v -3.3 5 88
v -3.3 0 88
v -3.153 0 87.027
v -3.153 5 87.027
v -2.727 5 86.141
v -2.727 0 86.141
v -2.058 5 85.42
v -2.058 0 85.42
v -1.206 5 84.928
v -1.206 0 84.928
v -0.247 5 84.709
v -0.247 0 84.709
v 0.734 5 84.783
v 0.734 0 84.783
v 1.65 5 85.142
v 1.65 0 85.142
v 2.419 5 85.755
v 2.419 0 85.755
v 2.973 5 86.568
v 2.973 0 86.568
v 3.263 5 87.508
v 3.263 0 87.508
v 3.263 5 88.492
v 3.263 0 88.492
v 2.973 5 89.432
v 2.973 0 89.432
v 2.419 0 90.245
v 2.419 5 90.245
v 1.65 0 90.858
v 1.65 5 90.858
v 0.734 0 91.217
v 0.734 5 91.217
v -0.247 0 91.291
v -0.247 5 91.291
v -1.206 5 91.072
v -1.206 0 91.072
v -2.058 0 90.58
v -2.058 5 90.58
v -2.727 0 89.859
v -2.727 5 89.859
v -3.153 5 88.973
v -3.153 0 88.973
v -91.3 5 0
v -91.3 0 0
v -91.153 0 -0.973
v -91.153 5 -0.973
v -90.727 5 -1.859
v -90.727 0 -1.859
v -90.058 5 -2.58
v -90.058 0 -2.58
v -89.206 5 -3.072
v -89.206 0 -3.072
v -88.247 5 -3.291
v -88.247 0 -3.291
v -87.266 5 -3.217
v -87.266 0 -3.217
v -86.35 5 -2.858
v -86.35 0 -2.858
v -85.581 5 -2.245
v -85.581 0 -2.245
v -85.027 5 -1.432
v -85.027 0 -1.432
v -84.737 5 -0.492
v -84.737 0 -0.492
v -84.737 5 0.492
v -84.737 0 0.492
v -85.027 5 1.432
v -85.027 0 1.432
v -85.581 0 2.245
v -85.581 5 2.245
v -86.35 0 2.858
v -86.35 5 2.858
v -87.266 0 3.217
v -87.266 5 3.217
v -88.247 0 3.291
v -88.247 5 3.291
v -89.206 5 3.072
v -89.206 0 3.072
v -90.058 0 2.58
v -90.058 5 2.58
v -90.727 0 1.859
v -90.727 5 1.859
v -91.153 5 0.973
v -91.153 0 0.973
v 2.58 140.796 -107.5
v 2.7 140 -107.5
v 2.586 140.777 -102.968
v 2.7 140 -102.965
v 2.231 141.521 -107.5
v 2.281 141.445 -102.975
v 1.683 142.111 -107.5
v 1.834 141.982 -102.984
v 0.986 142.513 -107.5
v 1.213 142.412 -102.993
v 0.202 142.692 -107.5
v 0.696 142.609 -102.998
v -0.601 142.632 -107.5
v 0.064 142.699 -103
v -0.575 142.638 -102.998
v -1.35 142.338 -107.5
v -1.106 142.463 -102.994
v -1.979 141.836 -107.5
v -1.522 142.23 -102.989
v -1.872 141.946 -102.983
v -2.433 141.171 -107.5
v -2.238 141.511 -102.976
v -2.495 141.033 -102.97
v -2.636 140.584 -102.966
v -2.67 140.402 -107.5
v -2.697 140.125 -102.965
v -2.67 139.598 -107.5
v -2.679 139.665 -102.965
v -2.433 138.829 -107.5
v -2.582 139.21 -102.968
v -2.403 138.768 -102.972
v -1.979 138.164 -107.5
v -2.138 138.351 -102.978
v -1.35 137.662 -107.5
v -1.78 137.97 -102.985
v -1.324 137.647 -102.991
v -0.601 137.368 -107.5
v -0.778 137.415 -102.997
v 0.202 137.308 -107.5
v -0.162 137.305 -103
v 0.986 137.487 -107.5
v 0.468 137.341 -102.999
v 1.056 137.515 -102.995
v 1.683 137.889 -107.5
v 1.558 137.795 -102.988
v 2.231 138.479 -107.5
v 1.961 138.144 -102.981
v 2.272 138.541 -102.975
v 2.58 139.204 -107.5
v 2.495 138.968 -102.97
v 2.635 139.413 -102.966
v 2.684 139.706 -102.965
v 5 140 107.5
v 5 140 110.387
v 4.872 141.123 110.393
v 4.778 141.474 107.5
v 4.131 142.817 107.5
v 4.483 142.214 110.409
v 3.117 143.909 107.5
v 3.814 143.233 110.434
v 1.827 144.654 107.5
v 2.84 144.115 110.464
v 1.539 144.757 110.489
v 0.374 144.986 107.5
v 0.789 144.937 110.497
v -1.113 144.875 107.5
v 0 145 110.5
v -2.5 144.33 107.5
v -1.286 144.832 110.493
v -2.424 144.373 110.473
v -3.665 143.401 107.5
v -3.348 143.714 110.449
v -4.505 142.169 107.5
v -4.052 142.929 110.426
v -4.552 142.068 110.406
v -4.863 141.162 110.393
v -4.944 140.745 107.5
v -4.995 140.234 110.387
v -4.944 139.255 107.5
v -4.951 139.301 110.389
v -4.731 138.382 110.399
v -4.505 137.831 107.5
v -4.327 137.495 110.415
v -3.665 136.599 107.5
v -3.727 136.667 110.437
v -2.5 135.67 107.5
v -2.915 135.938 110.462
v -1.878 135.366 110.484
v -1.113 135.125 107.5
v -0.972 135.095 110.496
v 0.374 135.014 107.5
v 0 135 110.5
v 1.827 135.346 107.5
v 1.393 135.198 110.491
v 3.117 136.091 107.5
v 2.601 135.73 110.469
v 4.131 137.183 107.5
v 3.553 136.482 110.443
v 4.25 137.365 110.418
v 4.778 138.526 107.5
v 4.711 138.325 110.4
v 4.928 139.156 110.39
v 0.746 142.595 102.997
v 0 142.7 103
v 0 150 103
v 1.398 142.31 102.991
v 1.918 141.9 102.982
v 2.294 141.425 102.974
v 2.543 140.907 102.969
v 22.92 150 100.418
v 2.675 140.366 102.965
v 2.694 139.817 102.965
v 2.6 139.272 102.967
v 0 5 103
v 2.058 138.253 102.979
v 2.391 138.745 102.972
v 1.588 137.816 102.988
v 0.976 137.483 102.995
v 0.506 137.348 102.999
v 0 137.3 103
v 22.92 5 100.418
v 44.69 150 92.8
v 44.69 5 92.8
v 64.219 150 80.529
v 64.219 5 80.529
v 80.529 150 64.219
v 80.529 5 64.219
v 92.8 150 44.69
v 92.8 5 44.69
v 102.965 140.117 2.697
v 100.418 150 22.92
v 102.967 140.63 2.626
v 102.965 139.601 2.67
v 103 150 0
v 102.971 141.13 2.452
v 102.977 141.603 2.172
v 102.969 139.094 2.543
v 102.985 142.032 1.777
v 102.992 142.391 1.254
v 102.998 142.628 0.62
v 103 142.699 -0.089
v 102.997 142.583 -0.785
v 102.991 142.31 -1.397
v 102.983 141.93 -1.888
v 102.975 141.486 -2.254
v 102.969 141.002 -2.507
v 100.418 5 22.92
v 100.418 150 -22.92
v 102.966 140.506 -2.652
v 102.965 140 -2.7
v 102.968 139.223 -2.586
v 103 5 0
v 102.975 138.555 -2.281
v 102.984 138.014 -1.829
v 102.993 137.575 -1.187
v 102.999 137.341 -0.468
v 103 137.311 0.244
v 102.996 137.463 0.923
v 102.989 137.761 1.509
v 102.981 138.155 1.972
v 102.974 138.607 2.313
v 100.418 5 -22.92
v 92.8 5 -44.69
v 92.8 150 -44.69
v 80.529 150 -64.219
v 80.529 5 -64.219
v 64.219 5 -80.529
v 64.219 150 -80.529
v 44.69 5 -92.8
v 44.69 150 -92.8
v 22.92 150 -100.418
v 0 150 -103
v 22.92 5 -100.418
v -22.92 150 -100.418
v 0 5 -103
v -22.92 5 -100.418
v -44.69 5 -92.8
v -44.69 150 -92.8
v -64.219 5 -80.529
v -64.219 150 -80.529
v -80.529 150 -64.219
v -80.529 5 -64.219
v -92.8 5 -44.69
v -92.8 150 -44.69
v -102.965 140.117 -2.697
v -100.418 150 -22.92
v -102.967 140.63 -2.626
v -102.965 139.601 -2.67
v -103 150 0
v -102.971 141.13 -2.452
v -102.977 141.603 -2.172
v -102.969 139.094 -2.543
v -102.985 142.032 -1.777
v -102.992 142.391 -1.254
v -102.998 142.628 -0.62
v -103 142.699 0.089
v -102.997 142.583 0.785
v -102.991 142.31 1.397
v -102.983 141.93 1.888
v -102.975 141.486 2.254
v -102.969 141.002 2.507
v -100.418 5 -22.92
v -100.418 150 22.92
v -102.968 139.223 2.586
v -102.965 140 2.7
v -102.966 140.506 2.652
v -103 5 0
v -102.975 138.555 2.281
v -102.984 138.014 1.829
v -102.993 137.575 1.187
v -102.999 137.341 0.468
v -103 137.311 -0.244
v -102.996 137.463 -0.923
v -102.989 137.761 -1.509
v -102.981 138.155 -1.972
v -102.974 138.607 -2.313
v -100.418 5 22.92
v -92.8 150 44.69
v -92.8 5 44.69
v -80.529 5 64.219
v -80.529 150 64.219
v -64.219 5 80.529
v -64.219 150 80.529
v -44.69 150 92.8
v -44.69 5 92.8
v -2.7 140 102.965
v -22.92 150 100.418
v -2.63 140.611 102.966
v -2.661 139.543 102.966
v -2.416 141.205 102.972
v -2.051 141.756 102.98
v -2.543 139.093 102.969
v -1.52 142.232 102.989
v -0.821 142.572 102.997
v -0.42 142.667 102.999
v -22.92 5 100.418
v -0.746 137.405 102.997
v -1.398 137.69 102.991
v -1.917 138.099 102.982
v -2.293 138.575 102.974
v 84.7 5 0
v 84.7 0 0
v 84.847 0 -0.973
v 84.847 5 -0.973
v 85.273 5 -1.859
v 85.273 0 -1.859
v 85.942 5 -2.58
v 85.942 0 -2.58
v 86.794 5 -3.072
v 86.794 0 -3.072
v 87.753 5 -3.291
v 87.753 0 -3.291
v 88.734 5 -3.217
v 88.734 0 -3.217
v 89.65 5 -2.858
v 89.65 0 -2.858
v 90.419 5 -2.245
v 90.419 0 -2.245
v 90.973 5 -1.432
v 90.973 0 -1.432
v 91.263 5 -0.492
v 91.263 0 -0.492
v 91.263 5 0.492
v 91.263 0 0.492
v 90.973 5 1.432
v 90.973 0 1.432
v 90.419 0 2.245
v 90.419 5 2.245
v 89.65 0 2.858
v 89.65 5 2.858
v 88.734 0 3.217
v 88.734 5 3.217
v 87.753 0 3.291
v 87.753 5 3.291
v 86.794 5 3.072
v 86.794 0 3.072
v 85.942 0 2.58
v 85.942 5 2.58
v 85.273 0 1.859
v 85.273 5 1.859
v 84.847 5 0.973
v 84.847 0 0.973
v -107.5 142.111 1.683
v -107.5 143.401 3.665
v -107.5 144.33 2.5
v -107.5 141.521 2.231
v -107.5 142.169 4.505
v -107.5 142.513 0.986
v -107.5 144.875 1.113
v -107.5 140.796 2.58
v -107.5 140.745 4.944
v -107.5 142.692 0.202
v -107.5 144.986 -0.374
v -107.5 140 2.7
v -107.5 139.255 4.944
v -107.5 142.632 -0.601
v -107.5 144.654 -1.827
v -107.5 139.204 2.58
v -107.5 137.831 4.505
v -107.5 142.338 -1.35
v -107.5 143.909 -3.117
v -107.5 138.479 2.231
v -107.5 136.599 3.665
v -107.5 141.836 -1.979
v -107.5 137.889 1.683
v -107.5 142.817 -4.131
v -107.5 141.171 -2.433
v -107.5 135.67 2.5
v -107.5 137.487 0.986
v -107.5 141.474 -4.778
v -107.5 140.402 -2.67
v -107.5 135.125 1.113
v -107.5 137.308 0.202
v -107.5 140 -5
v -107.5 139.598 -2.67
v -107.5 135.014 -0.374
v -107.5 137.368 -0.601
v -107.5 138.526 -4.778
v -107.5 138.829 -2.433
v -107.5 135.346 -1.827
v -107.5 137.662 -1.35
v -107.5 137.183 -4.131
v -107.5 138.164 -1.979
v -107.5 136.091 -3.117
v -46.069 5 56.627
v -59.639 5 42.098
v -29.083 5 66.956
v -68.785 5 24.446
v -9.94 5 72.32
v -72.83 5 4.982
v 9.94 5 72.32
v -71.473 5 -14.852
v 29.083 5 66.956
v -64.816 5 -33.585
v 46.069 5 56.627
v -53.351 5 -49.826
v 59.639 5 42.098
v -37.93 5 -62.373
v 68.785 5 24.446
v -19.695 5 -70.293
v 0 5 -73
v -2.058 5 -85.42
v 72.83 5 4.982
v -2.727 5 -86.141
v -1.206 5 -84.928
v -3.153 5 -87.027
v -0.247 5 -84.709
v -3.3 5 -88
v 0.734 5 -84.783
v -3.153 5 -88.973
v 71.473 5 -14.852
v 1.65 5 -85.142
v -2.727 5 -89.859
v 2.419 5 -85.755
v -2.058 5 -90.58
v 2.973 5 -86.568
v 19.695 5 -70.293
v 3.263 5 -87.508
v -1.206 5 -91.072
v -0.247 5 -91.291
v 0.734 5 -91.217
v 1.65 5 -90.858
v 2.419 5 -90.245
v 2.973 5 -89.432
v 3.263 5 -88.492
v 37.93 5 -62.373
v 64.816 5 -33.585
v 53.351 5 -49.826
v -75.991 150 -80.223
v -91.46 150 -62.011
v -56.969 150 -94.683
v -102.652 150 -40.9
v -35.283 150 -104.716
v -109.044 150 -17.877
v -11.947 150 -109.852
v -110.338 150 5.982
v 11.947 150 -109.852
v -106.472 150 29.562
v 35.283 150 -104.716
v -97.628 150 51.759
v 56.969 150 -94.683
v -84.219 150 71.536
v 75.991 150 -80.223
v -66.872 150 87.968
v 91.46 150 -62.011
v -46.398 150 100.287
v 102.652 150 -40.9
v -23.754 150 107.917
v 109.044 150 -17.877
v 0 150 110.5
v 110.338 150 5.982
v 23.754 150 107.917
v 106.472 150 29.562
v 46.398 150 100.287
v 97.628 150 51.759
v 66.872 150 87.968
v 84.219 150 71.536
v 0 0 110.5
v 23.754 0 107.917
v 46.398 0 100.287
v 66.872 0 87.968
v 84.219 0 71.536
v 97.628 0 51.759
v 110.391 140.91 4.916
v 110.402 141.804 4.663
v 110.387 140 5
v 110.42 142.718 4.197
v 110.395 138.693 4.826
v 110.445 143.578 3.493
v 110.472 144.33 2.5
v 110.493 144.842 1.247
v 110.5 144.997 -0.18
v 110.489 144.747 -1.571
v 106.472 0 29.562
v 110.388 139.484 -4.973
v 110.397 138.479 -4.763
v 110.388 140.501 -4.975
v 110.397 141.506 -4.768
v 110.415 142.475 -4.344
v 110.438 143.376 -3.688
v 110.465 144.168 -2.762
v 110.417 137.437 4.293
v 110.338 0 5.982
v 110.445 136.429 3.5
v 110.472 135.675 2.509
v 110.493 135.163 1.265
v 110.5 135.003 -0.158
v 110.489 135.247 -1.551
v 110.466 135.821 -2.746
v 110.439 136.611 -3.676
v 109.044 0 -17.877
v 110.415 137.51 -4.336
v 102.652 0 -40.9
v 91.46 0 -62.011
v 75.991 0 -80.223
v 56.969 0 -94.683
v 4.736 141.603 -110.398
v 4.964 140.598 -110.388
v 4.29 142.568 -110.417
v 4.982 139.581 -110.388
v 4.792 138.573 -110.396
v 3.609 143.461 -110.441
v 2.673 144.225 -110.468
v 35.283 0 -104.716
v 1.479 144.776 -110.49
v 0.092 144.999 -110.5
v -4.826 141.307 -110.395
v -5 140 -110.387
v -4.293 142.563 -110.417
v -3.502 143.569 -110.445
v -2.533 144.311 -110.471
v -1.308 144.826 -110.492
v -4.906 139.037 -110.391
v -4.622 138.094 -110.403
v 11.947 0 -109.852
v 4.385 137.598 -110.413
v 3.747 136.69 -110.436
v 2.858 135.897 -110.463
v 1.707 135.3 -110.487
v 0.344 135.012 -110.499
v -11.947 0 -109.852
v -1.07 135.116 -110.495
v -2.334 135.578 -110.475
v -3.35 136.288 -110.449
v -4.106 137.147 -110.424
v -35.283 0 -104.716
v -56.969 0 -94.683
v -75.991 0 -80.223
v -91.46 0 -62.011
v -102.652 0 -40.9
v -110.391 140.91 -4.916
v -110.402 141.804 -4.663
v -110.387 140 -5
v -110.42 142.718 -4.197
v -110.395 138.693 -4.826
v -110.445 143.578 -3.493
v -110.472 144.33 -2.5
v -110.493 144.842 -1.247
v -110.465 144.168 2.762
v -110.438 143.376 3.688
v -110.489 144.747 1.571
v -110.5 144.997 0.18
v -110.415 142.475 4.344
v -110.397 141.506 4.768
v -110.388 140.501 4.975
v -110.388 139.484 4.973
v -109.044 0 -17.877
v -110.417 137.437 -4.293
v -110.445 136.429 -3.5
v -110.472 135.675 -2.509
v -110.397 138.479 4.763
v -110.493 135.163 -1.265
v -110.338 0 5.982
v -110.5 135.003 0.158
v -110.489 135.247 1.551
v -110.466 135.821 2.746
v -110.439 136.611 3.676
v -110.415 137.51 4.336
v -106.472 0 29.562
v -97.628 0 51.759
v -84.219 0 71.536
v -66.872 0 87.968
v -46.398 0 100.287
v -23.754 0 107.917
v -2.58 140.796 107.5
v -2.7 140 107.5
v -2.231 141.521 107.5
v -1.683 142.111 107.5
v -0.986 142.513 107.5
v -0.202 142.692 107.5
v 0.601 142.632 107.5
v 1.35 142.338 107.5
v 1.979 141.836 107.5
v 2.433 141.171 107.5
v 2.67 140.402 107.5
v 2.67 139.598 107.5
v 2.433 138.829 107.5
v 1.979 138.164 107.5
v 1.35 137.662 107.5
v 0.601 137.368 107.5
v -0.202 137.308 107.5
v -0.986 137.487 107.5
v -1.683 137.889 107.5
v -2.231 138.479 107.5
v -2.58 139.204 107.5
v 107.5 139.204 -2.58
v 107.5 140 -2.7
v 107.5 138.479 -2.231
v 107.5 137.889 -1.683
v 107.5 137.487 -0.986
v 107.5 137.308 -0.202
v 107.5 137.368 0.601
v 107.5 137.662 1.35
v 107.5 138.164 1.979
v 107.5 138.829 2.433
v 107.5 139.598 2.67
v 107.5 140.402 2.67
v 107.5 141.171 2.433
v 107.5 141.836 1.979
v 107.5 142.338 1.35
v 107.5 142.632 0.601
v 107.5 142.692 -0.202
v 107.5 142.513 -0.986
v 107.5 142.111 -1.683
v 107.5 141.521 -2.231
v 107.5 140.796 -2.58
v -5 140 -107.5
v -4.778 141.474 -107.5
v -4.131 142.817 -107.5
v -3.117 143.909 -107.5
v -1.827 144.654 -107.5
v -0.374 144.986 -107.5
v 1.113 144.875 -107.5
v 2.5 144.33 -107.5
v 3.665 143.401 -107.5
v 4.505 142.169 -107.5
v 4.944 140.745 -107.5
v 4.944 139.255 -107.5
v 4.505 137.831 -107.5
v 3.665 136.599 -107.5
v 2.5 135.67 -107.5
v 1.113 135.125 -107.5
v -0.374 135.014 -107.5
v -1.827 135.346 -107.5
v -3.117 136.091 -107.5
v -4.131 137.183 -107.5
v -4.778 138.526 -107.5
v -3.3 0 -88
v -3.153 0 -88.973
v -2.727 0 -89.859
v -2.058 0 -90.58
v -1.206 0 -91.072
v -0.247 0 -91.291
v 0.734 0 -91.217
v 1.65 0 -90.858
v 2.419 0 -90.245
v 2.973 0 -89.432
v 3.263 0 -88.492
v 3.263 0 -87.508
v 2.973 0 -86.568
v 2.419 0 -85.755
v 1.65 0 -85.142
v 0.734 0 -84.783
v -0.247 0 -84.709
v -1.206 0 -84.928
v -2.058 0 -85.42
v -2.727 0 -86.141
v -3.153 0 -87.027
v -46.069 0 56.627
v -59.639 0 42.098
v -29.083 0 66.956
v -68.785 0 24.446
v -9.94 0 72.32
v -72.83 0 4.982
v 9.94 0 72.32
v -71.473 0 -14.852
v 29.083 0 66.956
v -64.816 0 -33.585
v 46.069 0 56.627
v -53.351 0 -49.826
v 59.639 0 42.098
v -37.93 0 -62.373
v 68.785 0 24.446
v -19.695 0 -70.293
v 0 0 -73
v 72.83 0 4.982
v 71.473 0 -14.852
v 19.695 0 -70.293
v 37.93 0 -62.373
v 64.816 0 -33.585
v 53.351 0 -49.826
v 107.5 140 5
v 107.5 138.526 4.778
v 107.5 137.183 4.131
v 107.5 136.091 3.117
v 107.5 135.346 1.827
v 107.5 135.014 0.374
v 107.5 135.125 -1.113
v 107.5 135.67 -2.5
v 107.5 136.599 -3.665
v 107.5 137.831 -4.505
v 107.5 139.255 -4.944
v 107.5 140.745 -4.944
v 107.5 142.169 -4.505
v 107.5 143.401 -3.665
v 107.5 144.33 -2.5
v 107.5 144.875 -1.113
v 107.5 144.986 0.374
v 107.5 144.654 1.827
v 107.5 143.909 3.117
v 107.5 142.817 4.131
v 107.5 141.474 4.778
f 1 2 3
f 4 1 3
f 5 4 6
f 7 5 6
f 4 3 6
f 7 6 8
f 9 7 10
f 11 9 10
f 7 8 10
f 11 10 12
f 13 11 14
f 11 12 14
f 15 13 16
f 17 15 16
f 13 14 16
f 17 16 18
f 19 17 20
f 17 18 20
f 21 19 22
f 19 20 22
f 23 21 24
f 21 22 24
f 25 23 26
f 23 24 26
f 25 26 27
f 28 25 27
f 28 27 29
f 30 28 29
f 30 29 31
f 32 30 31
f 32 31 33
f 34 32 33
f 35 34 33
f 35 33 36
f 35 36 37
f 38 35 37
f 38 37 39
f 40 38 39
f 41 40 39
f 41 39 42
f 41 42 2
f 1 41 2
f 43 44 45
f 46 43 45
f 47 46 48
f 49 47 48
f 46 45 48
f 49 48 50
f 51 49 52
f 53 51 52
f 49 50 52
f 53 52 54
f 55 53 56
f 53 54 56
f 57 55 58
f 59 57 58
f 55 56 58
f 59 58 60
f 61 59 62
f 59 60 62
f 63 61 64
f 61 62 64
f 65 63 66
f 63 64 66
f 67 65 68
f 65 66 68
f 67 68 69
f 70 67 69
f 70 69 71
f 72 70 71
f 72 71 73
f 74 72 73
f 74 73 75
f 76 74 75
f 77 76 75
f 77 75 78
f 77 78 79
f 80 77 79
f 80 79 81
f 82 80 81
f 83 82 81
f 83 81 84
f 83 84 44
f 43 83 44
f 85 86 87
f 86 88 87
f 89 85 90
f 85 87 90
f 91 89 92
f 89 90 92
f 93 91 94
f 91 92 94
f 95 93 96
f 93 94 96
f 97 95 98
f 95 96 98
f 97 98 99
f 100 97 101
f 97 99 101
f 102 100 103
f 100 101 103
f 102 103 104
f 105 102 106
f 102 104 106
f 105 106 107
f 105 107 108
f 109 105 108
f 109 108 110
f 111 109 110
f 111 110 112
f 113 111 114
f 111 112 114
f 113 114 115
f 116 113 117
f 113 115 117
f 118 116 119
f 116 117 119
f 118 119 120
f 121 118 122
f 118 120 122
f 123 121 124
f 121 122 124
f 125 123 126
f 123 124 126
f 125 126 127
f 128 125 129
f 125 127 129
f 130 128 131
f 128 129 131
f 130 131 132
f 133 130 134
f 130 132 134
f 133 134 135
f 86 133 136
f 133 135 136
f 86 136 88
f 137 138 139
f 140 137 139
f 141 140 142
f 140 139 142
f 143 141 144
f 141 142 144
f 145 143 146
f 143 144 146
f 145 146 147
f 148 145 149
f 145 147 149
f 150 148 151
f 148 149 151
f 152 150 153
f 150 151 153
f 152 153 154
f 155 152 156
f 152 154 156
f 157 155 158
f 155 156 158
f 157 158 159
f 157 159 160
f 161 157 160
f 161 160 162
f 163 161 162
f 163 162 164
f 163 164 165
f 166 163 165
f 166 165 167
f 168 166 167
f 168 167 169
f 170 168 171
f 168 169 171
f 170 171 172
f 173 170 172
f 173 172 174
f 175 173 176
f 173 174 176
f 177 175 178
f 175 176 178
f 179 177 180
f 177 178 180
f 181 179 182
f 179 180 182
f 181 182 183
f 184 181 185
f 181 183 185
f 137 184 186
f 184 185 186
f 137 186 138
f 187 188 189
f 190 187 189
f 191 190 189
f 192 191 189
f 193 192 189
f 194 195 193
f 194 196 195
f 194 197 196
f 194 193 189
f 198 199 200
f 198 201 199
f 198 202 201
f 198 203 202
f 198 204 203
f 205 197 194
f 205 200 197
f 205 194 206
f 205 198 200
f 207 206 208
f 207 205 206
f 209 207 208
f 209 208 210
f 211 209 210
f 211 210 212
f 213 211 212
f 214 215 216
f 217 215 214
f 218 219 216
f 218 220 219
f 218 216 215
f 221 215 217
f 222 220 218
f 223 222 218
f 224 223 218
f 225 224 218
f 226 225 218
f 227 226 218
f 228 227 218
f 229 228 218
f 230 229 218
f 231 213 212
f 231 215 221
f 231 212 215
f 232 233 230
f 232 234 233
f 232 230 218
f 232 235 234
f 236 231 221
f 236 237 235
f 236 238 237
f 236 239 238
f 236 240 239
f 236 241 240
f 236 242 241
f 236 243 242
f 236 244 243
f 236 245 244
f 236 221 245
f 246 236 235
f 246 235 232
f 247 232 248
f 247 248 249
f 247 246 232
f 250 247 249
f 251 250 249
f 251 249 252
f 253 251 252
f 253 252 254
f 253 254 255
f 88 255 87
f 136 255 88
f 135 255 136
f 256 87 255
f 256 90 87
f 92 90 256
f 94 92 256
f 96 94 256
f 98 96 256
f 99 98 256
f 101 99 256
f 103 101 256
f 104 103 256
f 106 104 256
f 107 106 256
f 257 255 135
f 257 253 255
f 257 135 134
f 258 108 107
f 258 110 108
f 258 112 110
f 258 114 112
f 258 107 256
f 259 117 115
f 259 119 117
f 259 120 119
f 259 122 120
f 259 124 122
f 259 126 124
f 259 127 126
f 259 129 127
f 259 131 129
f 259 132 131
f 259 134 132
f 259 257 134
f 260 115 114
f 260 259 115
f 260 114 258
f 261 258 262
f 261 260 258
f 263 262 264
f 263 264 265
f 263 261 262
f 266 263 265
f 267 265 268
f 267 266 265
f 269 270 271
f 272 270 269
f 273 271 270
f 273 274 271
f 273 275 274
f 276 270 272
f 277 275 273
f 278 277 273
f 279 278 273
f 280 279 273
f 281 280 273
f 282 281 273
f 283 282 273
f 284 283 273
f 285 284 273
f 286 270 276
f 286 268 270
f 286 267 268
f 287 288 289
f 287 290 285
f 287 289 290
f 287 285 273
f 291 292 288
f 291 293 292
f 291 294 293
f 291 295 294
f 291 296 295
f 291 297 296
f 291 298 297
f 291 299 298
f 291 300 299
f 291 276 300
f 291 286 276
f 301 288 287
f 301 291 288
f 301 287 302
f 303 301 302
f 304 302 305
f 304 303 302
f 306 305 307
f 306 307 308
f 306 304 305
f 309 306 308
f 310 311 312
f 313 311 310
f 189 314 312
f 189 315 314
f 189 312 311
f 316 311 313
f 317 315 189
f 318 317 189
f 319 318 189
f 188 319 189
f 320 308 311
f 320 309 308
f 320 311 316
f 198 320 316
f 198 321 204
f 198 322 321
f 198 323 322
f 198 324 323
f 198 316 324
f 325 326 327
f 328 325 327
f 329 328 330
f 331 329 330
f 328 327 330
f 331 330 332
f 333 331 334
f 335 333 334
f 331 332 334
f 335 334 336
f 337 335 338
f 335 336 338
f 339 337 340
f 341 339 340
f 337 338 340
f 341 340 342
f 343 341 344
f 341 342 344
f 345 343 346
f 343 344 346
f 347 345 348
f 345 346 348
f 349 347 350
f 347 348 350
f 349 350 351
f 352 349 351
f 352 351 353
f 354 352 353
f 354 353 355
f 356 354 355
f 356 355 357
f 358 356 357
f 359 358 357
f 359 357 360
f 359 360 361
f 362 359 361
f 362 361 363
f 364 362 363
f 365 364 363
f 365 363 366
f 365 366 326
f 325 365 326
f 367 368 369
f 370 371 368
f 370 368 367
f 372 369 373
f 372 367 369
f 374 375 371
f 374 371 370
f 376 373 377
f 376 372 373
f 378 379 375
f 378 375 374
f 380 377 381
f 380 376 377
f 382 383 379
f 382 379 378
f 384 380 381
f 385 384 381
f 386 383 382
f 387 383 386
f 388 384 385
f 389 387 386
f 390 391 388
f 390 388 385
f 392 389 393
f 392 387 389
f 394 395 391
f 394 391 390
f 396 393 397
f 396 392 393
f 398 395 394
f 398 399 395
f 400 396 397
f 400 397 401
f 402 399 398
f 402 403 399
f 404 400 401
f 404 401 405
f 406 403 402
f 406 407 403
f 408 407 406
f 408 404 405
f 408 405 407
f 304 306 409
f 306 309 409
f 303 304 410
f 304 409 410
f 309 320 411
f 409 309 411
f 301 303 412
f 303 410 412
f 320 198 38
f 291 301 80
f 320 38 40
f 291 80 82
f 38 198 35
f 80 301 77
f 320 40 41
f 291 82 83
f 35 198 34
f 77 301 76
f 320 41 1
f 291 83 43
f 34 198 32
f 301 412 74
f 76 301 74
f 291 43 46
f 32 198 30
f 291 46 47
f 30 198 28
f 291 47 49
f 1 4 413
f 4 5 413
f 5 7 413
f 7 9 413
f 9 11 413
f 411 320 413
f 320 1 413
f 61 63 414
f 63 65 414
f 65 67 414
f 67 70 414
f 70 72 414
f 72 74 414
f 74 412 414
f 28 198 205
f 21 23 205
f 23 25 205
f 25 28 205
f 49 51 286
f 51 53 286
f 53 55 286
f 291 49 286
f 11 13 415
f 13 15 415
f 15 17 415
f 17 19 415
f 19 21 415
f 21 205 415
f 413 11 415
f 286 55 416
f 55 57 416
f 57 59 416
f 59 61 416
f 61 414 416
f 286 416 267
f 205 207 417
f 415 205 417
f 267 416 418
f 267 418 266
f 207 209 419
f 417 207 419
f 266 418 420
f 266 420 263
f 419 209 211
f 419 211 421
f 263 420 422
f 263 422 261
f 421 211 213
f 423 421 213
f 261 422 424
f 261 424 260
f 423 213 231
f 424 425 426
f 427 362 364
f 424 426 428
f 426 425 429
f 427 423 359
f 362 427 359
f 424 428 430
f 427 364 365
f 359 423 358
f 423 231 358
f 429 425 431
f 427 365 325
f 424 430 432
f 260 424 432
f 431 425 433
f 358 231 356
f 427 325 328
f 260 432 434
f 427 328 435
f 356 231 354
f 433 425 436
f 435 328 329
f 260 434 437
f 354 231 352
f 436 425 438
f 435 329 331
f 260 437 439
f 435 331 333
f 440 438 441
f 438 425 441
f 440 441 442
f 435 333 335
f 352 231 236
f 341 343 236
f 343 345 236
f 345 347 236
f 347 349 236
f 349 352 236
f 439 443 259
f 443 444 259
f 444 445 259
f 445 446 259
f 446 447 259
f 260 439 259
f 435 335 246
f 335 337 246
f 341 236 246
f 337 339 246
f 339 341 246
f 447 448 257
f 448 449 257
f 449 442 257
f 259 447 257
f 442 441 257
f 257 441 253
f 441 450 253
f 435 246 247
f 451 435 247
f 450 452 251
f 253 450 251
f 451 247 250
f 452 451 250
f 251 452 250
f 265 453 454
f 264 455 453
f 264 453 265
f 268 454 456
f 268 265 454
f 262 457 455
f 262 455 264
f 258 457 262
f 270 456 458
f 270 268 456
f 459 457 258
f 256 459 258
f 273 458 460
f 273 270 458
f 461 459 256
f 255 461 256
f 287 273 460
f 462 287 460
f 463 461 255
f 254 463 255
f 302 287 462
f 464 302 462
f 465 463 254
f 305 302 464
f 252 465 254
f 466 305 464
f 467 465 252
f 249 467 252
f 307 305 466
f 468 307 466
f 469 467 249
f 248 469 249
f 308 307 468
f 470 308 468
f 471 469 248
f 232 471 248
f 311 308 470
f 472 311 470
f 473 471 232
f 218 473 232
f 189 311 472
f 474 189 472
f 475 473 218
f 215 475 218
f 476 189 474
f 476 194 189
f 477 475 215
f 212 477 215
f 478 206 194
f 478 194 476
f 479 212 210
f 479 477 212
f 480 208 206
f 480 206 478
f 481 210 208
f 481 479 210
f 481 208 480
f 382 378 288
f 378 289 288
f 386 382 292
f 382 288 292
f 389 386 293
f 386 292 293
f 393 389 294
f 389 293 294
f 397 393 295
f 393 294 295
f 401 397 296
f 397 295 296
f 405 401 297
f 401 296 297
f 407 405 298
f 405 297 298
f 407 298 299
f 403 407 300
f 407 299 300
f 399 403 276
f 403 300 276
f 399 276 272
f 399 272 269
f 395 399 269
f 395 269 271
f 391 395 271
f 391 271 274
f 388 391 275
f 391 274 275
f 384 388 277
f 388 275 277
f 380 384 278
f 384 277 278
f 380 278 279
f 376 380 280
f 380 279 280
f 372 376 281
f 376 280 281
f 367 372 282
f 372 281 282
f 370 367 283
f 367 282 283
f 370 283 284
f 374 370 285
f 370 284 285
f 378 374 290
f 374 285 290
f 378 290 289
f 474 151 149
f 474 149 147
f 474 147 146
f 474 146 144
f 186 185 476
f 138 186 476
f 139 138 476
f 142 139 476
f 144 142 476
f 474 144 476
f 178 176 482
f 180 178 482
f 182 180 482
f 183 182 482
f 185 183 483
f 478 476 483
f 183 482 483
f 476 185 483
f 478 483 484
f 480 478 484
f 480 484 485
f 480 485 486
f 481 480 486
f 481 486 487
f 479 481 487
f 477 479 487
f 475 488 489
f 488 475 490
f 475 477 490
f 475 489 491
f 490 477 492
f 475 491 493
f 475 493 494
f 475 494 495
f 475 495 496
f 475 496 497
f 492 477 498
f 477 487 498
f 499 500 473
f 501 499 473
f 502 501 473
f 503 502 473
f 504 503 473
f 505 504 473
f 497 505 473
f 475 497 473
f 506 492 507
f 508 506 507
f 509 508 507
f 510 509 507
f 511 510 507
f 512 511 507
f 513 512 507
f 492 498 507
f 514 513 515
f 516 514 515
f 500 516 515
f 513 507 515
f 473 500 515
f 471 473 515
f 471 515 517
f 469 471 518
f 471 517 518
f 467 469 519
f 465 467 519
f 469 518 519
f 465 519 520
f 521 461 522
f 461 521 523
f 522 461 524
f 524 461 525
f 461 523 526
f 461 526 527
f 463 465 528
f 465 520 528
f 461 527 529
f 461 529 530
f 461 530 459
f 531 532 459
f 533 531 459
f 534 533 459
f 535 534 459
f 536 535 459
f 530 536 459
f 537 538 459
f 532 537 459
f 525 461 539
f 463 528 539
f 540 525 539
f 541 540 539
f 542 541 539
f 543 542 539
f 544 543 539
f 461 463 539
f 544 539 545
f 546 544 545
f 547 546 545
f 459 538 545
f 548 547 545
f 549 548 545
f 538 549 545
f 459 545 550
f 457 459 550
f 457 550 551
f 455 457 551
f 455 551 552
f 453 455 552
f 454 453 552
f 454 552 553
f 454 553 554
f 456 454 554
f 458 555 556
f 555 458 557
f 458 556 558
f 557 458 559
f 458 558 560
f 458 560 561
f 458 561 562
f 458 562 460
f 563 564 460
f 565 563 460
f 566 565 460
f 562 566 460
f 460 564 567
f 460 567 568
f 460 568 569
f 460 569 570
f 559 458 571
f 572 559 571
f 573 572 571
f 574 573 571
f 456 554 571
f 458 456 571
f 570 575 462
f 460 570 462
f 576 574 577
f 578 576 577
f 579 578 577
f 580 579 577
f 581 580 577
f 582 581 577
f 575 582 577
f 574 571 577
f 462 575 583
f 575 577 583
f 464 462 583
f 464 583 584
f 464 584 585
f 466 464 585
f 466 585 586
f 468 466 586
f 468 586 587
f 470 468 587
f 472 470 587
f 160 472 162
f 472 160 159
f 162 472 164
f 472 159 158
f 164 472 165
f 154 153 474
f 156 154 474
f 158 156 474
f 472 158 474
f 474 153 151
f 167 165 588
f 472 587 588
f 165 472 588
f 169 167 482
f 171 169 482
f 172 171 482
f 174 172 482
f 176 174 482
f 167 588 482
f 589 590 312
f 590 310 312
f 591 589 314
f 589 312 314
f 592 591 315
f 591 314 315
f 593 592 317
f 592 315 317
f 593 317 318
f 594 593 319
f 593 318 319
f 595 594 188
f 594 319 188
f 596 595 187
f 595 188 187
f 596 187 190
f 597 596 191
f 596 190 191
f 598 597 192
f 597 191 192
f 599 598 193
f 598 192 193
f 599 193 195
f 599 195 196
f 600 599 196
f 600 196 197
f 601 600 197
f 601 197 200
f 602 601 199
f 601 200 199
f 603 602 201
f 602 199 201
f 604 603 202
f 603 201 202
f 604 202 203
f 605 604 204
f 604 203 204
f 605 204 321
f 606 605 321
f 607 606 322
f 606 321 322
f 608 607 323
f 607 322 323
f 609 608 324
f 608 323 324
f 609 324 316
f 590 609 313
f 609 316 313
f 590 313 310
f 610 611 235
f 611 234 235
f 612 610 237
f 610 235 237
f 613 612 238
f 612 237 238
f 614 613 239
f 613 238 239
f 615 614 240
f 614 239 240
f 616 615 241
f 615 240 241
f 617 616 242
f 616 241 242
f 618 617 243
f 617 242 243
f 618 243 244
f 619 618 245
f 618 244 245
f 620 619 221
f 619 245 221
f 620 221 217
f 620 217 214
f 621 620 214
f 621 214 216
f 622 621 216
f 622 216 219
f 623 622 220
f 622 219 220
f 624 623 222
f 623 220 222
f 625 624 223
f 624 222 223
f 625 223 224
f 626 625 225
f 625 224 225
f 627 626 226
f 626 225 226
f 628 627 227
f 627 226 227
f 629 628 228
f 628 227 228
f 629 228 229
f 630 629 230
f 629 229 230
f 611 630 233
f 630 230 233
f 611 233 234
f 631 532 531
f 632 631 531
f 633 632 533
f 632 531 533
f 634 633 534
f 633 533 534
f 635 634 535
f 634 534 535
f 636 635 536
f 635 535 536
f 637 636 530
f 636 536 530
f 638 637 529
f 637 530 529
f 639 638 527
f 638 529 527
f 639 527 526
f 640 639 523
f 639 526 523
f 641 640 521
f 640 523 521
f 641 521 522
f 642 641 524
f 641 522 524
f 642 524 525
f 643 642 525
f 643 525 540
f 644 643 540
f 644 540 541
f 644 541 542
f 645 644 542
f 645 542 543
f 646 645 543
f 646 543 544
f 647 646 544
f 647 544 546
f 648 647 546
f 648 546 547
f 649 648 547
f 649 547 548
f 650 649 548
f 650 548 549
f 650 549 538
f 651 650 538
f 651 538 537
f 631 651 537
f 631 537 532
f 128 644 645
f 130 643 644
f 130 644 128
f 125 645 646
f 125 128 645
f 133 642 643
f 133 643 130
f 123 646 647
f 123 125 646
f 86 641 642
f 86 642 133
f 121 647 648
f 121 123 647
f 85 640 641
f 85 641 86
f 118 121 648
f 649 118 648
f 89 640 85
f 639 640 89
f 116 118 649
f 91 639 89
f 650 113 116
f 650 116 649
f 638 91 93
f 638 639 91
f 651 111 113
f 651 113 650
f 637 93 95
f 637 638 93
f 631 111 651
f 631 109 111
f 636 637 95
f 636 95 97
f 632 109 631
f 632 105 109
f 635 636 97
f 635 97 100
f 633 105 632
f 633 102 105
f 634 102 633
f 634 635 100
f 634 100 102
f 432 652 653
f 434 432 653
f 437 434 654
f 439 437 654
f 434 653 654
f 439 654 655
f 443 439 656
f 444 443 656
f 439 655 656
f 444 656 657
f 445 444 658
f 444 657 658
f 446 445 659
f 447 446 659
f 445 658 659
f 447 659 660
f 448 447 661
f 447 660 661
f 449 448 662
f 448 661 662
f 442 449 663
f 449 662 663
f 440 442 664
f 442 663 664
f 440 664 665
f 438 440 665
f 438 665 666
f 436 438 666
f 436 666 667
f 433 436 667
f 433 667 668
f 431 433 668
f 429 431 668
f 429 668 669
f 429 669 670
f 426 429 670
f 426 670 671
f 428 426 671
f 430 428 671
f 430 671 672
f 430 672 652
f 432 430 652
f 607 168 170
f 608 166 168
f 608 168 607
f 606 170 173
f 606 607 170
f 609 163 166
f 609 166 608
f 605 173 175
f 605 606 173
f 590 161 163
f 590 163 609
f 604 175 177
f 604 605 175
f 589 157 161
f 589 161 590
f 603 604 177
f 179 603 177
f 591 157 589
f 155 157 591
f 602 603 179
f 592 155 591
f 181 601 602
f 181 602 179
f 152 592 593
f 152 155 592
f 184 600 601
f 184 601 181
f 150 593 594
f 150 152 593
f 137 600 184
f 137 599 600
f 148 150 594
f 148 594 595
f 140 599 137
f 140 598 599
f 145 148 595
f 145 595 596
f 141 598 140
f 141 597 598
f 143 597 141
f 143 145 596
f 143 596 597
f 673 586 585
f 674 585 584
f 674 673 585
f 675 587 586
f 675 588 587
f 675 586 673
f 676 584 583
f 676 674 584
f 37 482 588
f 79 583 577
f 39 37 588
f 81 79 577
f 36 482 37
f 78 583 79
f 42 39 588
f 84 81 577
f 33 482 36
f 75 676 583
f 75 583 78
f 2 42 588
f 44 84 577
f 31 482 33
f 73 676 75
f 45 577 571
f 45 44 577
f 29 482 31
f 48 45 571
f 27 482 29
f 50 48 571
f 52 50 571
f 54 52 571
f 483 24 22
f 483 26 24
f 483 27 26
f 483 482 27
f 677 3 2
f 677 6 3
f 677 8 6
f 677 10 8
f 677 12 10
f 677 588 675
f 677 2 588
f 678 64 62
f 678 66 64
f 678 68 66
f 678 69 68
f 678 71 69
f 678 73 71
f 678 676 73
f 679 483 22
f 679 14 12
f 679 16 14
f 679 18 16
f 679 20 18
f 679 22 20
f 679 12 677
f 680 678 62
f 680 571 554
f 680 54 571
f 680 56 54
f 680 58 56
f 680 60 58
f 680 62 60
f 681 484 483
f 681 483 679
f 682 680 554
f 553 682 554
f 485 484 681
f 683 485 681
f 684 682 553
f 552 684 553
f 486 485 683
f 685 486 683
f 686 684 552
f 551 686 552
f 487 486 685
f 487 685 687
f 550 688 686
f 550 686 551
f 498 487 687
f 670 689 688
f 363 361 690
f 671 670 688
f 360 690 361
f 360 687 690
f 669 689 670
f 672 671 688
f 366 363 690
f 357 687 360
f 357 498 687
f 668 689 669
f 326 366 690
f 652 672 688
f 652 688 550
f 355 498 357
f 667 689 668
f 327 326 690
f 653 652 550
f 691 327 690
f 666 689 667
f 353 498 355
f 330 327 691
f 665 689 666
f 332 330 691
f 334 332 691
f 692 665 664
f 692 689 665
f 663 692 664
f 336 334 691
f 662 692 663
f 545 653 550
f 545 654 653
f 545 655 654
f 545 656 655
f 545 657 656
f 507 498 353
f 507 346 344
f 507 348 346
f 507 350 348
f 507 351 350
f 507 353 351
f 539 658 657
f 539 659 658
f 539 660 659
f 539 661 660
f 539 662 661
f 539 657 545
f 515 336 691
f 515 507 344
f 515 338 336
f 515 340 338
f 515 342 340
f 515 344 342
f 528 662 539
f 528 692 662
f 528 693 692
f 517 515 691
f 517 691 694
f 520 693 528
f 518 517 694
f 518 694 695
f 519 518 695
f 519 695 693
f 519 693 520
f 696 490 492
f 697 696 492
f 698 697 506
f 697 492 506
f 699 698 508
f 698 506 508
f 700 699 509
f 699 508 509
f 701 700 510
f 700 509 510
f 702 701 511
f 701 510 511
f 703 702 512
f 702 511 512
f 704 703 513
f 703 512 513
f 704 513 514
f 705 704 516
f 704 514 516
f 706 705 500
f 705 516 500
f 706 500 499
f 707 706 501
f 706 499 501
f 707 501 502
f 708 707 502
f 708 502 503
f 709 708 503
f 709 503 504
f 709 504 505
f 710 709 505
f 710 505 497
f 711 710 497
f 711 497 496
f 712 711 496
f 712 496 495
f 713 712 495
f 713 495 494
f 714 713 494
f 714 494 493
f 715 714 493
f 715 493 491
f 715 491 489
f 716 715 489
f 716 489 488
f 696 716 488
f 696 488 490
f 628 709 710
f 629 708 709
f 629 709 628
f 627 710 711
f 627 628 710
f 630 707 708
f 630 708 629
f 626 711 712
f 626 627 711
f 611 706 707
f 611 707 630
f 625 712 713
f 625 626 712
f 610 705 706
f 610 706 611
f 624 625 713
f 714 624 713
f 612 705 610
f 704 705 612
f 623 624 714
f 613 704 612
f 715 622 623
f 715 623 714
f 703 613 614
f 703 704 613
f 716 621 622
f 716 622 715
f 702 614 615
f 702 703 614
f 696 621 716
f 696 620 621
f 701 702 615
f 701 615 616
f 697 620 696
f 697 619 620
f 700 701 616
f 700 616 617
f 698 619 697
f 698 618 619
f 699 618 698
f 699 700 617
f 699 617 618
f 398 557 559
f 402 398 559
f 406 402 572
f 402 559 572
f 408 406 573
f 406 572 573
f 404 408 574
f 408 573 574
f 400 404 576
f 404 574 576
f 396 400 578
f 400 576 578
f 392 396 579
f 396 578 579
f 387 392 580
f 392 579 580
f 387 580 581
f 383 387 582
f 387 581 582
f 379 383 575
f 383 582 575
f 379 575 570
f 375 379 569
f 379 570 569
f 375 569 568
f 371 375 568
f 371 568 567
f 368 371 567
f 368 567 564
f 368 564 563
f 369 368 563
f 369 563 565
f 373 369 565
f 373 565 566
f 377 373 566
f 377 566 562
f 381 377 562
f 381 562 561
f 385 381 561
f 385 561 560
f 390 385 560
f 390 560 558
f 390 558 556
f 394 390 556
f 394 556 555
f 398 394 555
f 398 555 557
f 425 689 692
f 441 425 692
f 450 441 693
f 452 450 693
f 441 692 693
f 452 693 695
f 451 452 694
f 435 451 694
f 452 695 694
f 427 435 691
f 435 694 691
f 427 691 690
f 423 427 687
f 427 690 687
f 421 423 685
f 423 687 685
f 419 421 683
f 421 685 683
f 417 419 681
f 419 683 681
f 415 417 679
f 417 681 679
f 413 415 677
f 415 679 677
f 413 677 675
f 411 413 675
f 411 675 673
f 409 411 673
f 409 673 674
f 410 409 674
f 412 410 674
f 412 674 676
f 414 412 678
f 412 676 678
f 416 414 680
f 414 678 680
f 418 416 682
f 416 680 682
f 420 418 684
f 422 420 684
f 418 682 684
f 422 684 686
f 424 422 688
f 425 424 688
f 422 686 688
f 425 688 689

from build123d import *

# Parameters (mm, degrees)
SCHIZZO1_R                                           = 110.5
SCHIZZO1_R_2                                         = 103
ESTRUSIONE_ESTRUSIONE1_DEPTH                         = 150
FORO_LAMATO_PER_BULLONE_M12_A_TESTA_ESAG_D           = 5.4
FORO_LAMATO_PER_BULLONE_M12_A_TESTA_ESAG_DEPTH       = 8.1
FORO_LAMATO_PER_BULLONE_M12_A_TESTA_ESAG_CBORE_D     = 10
FORO_LAMATO_PER_BULLONE_M12_A_TESTA_ESAG_CBORE_DEPTH = 3
FORO_LAMATO_PER_BULLONE_M12_A_TESTA_ESAG_TIP         = 1.622323671
FORO_LAMATO_PER_BULLONE_M12_A_TESTA_2_D              = 5.4
FORO_LAMATO_PER_BULLONE_M12_A_TESTA_2_DEPTH          = 8.1
FORO_LAMATO_PER_BULLONE_M12_A_TESTA_2_CBORE_D        = 10
FORO_LAMATO_PER_BULLONE_M12_A_TESTA_2_CBORE_DEPTH    = 3
FORO_LAMATO_PER_BULLONE_M12_A_TESTA_2_TIP            = 1.622323671
FORO_LAMATO_PER_BULLONE_M12_A_TESTA_3_D              = 5.4
FORO_LAMATO_PER_BULLONE_M12_A_TESTA_3_DEPTH          = 8.1
FORO_LAMATO_PER_BULLONE_M12_A_TESTA_3_CBORE_D        = 10
FORO_LAMATO_PER_BULLONE_M12_A_TESTA_3_CBORE_DEPTH    = 3
FORO_LAMATO_PER_BULLONE_M12_A_TESTA_3_TIP            = 1.622323671
FORO_LAMATO_PER_BULLONE_M12_A_TESTA_4_D              = 5.4
FORO_LAMATO_PER_BULLONE_M12_A_TESTA_4_DEPTH          = 8.1
FORO_LAMATO_PER_BULLONE_M12_A_TESTA_4_CBORE_D        = 10
FORO_LAMATO_PER_BULLONE_M12_A_TESTA_4_CBORE_DEPTH    = 3
FORO_LAMATO_PER_BULLONE_M12_A_TESTA_4_TIP            = 1.622323671
SCHIZZO4_R                                           = 103
SCHIZZO4_R_2                                         = 73
ESTRUSIONE_ESTRUSIONE2_DEPTH                         = 5
FORO_PER_VITE_M6_1_D                                 = 6.6


with BuildPart() as part:
    # Schizzo1 → Estrusione-Estrusione1 (new body)
    with BuildSketch(Plane(origin=(0, 0, 0), x_dir=(1, 0, 0), z_dir=(0, 1, 0))):
        with Locations(Location((0, 0, 0), (0, 0, 270))):
            Circle(SCHIZZO1_R)
        with Locations(Location((0, 0, 0), (0, 0, 270))):
            Circle(SCHIZZO1_R_2, mode=Mode.SUBTRACT)
    extrude(amount=ESTRUSIONE_ESTRUSIONE1_DEPTH)

    # Foro lamato per Bullone M12 a testa esagonale (Classe superiore)-1
    with Locations(Plane(origin=(0, 140, 110.5), x_dir=(1, 0, 0), z_dir=(0, 0, 1))):
        with Locations((0, 0)):
            CounterBoreHole(FORO_LAMATO_PER_BULLONE_M12_A_TESTA_ESAG_D / 2, FORO_LAMATO_PER_BULLONE_M12_A_TESTA_ESAG_CBORE_D / 2, FORO_LAMATO_PER_BULLONE_M12_A_TESTA_ESAG_CBORE_DEPTH, depth=FORO_LAMATO_PER_BULLONE_M12_A_TESTA_ESAG_DEPTH)
            with Locations((0, 0, -(FORO_LAMATO_PER_BULLONE_M12_A_TESTA_ESAG_DEPTH + FORO_LAMATO_PER_BULLONE_M12_A_TESTA_ESAG_TIP / 2))):  # 118° drill point
                Cone(0, FORO_LAMATO_PER_BULLONE_M12_A_TESTA_ESAG_D / 2, FORO_LAMATO_PER_BULLONE_M12_A_TESTA_ESAG_TIP, mode=Mode.SUBTRACT)

    # Foro lamato per Bullone M12 a testa  2
    with Locations(Plane(origin=(110.5, 140, 0), x_dir=(0, 0, 1), z_dir=(1, 0, 0))):
        with Locations((0, 0)):
            CounterBoreHole(FORO_LAMATO_PER_BULLONE_M12_A_TESTA_2_D / 2, FORO_LAMATO_PER_BULLONE_M12_A_TESTA_2_CBORE_D / 2, FORO_LAMATO_PER_BULLONE_M12_A_TESTA_2_CBORE_DEPTH, depth=FORO_LAMATO_PER_BULLONE_M12_A_TESTA_2_DEPTH)
            with Locations((0, 0, -(FORO_LAMATO_PER_BULLONE_M12_A_TESTA_2_DEPTH + FORO_LAMATO_PER_BULLONE_M12_A_TESTA_2_TIP / 2))):  # 118° drill point
                Cone(0, FORO_LAMATO_PER_BULLONE_M12_A_TESTA_2_D / 2, FORO_LAMATO_PER_BULLONE_M12_A_TESTA_2_TIP, mode=Mode.SUBTRACT)

    # Foro lamato per Bullone M12 a testa  3
    with Locations(Plane(origin=(0, 140, -110.5), x_dir=(-1, 0, 0), z_dir=(0, 0, -1))):
        with Locations((0, 0)):
            CounterBoreHole(FORO_LAMATO_PER_BULLONE_M12_A_TESTA_3_D / 2, FORO_LAMATO_PER_BULLONE_M12_A_TESTA_3_CBORE_D / 2, FORO_LAMATO_PER_BULLONE_M12_A_TESTA_3_CBORE_DEPTH, depth=FORO_LAMATO_PER_BULLONE_M12_A_TESTA_3_DEPTH)
            with Locations((0, 0, -(FORO_LAMATO_PER_BULLONE_M12_A_TESTA_3_DEPTH + FORO_LAMATO_PER_BULLONE_M12_A_TESTA_3_TIP / 2))):  # 118° drill point
                Cone(0, FORO_LAMATO_PER_BULLONE_M12_A_TESTA_3_D / 2, FORO_LAMATO_PER_BULLONE_M12_A_TESTA_3_TIP, mode=Mode.SUBTRACT)

    # Foro lamato per Bullone M12 a testa  4
    with Locations(Plane(origin=(-110.5, 140, 0), x_dir=(0, 0, -1), z_dir=(-1, 0, 0))):
        with Locations((0, 0)):
            CounterBoreHole(FORO_LAMATO_PER_BULLONE_M12_A_TESTA_4_D / 2, FORO_LAMATO_PER_BULLONE_M12_A_TESTA_4_CBORE_D / 2, FORO_LAMATO_PER_BULLONE_M12_A_TESTA_4_CBORE_DEPTH, depth=FORO_LAMATO_PER_BULLONE_M12_A_TESTA_4_DEPTH)
            with Locations((0, 0, -(FORO_LAMATO_PER_BULLONE_M12_A_TESTA_4_DEPTH + FORO_LAMATO_PER_BULLONE_M12_A_TESTA_4_TIP / 2))):  # 118° drill point
                Cone(0, FORO_LAMATO_PER_BULLONE_M12_A_TESTA_4_D / 2, FORO_LAMATO_PER_BULLONE_M12_A_TESTA_4_TIP, mode=Mode.SUBTRACT)

    # Schizzo4 → Estrusione-Estrusione2 (add)
    with BuildSketch(Plane.XZ):
        with Locations(Location((0, 0, 0), (0, 0, 270))):
            Circle(SCHIZZO4_R)
        with Locations(Location((0, 0, 0), (0, 0, 270))):
            Circle(SCHIZZO4_R_2, mode=Mode.SUBTRACT)
    extrude(amount=-ESTRUSIONE_ESTRUSIONE2_DEPTH)

    # Foro per Vite M6-1 (through all)
    with Locations(Plane(origin=(0, 5, 0), x_dir=(1, 0, 0), z_dir=(0, 1, 0))):
        with Locations((0, -88), (-88, 0), (88, 0), (0, 88)):
            Hole(FORO_PER_VITE_M6_1_D / 2)


solid = part.part
